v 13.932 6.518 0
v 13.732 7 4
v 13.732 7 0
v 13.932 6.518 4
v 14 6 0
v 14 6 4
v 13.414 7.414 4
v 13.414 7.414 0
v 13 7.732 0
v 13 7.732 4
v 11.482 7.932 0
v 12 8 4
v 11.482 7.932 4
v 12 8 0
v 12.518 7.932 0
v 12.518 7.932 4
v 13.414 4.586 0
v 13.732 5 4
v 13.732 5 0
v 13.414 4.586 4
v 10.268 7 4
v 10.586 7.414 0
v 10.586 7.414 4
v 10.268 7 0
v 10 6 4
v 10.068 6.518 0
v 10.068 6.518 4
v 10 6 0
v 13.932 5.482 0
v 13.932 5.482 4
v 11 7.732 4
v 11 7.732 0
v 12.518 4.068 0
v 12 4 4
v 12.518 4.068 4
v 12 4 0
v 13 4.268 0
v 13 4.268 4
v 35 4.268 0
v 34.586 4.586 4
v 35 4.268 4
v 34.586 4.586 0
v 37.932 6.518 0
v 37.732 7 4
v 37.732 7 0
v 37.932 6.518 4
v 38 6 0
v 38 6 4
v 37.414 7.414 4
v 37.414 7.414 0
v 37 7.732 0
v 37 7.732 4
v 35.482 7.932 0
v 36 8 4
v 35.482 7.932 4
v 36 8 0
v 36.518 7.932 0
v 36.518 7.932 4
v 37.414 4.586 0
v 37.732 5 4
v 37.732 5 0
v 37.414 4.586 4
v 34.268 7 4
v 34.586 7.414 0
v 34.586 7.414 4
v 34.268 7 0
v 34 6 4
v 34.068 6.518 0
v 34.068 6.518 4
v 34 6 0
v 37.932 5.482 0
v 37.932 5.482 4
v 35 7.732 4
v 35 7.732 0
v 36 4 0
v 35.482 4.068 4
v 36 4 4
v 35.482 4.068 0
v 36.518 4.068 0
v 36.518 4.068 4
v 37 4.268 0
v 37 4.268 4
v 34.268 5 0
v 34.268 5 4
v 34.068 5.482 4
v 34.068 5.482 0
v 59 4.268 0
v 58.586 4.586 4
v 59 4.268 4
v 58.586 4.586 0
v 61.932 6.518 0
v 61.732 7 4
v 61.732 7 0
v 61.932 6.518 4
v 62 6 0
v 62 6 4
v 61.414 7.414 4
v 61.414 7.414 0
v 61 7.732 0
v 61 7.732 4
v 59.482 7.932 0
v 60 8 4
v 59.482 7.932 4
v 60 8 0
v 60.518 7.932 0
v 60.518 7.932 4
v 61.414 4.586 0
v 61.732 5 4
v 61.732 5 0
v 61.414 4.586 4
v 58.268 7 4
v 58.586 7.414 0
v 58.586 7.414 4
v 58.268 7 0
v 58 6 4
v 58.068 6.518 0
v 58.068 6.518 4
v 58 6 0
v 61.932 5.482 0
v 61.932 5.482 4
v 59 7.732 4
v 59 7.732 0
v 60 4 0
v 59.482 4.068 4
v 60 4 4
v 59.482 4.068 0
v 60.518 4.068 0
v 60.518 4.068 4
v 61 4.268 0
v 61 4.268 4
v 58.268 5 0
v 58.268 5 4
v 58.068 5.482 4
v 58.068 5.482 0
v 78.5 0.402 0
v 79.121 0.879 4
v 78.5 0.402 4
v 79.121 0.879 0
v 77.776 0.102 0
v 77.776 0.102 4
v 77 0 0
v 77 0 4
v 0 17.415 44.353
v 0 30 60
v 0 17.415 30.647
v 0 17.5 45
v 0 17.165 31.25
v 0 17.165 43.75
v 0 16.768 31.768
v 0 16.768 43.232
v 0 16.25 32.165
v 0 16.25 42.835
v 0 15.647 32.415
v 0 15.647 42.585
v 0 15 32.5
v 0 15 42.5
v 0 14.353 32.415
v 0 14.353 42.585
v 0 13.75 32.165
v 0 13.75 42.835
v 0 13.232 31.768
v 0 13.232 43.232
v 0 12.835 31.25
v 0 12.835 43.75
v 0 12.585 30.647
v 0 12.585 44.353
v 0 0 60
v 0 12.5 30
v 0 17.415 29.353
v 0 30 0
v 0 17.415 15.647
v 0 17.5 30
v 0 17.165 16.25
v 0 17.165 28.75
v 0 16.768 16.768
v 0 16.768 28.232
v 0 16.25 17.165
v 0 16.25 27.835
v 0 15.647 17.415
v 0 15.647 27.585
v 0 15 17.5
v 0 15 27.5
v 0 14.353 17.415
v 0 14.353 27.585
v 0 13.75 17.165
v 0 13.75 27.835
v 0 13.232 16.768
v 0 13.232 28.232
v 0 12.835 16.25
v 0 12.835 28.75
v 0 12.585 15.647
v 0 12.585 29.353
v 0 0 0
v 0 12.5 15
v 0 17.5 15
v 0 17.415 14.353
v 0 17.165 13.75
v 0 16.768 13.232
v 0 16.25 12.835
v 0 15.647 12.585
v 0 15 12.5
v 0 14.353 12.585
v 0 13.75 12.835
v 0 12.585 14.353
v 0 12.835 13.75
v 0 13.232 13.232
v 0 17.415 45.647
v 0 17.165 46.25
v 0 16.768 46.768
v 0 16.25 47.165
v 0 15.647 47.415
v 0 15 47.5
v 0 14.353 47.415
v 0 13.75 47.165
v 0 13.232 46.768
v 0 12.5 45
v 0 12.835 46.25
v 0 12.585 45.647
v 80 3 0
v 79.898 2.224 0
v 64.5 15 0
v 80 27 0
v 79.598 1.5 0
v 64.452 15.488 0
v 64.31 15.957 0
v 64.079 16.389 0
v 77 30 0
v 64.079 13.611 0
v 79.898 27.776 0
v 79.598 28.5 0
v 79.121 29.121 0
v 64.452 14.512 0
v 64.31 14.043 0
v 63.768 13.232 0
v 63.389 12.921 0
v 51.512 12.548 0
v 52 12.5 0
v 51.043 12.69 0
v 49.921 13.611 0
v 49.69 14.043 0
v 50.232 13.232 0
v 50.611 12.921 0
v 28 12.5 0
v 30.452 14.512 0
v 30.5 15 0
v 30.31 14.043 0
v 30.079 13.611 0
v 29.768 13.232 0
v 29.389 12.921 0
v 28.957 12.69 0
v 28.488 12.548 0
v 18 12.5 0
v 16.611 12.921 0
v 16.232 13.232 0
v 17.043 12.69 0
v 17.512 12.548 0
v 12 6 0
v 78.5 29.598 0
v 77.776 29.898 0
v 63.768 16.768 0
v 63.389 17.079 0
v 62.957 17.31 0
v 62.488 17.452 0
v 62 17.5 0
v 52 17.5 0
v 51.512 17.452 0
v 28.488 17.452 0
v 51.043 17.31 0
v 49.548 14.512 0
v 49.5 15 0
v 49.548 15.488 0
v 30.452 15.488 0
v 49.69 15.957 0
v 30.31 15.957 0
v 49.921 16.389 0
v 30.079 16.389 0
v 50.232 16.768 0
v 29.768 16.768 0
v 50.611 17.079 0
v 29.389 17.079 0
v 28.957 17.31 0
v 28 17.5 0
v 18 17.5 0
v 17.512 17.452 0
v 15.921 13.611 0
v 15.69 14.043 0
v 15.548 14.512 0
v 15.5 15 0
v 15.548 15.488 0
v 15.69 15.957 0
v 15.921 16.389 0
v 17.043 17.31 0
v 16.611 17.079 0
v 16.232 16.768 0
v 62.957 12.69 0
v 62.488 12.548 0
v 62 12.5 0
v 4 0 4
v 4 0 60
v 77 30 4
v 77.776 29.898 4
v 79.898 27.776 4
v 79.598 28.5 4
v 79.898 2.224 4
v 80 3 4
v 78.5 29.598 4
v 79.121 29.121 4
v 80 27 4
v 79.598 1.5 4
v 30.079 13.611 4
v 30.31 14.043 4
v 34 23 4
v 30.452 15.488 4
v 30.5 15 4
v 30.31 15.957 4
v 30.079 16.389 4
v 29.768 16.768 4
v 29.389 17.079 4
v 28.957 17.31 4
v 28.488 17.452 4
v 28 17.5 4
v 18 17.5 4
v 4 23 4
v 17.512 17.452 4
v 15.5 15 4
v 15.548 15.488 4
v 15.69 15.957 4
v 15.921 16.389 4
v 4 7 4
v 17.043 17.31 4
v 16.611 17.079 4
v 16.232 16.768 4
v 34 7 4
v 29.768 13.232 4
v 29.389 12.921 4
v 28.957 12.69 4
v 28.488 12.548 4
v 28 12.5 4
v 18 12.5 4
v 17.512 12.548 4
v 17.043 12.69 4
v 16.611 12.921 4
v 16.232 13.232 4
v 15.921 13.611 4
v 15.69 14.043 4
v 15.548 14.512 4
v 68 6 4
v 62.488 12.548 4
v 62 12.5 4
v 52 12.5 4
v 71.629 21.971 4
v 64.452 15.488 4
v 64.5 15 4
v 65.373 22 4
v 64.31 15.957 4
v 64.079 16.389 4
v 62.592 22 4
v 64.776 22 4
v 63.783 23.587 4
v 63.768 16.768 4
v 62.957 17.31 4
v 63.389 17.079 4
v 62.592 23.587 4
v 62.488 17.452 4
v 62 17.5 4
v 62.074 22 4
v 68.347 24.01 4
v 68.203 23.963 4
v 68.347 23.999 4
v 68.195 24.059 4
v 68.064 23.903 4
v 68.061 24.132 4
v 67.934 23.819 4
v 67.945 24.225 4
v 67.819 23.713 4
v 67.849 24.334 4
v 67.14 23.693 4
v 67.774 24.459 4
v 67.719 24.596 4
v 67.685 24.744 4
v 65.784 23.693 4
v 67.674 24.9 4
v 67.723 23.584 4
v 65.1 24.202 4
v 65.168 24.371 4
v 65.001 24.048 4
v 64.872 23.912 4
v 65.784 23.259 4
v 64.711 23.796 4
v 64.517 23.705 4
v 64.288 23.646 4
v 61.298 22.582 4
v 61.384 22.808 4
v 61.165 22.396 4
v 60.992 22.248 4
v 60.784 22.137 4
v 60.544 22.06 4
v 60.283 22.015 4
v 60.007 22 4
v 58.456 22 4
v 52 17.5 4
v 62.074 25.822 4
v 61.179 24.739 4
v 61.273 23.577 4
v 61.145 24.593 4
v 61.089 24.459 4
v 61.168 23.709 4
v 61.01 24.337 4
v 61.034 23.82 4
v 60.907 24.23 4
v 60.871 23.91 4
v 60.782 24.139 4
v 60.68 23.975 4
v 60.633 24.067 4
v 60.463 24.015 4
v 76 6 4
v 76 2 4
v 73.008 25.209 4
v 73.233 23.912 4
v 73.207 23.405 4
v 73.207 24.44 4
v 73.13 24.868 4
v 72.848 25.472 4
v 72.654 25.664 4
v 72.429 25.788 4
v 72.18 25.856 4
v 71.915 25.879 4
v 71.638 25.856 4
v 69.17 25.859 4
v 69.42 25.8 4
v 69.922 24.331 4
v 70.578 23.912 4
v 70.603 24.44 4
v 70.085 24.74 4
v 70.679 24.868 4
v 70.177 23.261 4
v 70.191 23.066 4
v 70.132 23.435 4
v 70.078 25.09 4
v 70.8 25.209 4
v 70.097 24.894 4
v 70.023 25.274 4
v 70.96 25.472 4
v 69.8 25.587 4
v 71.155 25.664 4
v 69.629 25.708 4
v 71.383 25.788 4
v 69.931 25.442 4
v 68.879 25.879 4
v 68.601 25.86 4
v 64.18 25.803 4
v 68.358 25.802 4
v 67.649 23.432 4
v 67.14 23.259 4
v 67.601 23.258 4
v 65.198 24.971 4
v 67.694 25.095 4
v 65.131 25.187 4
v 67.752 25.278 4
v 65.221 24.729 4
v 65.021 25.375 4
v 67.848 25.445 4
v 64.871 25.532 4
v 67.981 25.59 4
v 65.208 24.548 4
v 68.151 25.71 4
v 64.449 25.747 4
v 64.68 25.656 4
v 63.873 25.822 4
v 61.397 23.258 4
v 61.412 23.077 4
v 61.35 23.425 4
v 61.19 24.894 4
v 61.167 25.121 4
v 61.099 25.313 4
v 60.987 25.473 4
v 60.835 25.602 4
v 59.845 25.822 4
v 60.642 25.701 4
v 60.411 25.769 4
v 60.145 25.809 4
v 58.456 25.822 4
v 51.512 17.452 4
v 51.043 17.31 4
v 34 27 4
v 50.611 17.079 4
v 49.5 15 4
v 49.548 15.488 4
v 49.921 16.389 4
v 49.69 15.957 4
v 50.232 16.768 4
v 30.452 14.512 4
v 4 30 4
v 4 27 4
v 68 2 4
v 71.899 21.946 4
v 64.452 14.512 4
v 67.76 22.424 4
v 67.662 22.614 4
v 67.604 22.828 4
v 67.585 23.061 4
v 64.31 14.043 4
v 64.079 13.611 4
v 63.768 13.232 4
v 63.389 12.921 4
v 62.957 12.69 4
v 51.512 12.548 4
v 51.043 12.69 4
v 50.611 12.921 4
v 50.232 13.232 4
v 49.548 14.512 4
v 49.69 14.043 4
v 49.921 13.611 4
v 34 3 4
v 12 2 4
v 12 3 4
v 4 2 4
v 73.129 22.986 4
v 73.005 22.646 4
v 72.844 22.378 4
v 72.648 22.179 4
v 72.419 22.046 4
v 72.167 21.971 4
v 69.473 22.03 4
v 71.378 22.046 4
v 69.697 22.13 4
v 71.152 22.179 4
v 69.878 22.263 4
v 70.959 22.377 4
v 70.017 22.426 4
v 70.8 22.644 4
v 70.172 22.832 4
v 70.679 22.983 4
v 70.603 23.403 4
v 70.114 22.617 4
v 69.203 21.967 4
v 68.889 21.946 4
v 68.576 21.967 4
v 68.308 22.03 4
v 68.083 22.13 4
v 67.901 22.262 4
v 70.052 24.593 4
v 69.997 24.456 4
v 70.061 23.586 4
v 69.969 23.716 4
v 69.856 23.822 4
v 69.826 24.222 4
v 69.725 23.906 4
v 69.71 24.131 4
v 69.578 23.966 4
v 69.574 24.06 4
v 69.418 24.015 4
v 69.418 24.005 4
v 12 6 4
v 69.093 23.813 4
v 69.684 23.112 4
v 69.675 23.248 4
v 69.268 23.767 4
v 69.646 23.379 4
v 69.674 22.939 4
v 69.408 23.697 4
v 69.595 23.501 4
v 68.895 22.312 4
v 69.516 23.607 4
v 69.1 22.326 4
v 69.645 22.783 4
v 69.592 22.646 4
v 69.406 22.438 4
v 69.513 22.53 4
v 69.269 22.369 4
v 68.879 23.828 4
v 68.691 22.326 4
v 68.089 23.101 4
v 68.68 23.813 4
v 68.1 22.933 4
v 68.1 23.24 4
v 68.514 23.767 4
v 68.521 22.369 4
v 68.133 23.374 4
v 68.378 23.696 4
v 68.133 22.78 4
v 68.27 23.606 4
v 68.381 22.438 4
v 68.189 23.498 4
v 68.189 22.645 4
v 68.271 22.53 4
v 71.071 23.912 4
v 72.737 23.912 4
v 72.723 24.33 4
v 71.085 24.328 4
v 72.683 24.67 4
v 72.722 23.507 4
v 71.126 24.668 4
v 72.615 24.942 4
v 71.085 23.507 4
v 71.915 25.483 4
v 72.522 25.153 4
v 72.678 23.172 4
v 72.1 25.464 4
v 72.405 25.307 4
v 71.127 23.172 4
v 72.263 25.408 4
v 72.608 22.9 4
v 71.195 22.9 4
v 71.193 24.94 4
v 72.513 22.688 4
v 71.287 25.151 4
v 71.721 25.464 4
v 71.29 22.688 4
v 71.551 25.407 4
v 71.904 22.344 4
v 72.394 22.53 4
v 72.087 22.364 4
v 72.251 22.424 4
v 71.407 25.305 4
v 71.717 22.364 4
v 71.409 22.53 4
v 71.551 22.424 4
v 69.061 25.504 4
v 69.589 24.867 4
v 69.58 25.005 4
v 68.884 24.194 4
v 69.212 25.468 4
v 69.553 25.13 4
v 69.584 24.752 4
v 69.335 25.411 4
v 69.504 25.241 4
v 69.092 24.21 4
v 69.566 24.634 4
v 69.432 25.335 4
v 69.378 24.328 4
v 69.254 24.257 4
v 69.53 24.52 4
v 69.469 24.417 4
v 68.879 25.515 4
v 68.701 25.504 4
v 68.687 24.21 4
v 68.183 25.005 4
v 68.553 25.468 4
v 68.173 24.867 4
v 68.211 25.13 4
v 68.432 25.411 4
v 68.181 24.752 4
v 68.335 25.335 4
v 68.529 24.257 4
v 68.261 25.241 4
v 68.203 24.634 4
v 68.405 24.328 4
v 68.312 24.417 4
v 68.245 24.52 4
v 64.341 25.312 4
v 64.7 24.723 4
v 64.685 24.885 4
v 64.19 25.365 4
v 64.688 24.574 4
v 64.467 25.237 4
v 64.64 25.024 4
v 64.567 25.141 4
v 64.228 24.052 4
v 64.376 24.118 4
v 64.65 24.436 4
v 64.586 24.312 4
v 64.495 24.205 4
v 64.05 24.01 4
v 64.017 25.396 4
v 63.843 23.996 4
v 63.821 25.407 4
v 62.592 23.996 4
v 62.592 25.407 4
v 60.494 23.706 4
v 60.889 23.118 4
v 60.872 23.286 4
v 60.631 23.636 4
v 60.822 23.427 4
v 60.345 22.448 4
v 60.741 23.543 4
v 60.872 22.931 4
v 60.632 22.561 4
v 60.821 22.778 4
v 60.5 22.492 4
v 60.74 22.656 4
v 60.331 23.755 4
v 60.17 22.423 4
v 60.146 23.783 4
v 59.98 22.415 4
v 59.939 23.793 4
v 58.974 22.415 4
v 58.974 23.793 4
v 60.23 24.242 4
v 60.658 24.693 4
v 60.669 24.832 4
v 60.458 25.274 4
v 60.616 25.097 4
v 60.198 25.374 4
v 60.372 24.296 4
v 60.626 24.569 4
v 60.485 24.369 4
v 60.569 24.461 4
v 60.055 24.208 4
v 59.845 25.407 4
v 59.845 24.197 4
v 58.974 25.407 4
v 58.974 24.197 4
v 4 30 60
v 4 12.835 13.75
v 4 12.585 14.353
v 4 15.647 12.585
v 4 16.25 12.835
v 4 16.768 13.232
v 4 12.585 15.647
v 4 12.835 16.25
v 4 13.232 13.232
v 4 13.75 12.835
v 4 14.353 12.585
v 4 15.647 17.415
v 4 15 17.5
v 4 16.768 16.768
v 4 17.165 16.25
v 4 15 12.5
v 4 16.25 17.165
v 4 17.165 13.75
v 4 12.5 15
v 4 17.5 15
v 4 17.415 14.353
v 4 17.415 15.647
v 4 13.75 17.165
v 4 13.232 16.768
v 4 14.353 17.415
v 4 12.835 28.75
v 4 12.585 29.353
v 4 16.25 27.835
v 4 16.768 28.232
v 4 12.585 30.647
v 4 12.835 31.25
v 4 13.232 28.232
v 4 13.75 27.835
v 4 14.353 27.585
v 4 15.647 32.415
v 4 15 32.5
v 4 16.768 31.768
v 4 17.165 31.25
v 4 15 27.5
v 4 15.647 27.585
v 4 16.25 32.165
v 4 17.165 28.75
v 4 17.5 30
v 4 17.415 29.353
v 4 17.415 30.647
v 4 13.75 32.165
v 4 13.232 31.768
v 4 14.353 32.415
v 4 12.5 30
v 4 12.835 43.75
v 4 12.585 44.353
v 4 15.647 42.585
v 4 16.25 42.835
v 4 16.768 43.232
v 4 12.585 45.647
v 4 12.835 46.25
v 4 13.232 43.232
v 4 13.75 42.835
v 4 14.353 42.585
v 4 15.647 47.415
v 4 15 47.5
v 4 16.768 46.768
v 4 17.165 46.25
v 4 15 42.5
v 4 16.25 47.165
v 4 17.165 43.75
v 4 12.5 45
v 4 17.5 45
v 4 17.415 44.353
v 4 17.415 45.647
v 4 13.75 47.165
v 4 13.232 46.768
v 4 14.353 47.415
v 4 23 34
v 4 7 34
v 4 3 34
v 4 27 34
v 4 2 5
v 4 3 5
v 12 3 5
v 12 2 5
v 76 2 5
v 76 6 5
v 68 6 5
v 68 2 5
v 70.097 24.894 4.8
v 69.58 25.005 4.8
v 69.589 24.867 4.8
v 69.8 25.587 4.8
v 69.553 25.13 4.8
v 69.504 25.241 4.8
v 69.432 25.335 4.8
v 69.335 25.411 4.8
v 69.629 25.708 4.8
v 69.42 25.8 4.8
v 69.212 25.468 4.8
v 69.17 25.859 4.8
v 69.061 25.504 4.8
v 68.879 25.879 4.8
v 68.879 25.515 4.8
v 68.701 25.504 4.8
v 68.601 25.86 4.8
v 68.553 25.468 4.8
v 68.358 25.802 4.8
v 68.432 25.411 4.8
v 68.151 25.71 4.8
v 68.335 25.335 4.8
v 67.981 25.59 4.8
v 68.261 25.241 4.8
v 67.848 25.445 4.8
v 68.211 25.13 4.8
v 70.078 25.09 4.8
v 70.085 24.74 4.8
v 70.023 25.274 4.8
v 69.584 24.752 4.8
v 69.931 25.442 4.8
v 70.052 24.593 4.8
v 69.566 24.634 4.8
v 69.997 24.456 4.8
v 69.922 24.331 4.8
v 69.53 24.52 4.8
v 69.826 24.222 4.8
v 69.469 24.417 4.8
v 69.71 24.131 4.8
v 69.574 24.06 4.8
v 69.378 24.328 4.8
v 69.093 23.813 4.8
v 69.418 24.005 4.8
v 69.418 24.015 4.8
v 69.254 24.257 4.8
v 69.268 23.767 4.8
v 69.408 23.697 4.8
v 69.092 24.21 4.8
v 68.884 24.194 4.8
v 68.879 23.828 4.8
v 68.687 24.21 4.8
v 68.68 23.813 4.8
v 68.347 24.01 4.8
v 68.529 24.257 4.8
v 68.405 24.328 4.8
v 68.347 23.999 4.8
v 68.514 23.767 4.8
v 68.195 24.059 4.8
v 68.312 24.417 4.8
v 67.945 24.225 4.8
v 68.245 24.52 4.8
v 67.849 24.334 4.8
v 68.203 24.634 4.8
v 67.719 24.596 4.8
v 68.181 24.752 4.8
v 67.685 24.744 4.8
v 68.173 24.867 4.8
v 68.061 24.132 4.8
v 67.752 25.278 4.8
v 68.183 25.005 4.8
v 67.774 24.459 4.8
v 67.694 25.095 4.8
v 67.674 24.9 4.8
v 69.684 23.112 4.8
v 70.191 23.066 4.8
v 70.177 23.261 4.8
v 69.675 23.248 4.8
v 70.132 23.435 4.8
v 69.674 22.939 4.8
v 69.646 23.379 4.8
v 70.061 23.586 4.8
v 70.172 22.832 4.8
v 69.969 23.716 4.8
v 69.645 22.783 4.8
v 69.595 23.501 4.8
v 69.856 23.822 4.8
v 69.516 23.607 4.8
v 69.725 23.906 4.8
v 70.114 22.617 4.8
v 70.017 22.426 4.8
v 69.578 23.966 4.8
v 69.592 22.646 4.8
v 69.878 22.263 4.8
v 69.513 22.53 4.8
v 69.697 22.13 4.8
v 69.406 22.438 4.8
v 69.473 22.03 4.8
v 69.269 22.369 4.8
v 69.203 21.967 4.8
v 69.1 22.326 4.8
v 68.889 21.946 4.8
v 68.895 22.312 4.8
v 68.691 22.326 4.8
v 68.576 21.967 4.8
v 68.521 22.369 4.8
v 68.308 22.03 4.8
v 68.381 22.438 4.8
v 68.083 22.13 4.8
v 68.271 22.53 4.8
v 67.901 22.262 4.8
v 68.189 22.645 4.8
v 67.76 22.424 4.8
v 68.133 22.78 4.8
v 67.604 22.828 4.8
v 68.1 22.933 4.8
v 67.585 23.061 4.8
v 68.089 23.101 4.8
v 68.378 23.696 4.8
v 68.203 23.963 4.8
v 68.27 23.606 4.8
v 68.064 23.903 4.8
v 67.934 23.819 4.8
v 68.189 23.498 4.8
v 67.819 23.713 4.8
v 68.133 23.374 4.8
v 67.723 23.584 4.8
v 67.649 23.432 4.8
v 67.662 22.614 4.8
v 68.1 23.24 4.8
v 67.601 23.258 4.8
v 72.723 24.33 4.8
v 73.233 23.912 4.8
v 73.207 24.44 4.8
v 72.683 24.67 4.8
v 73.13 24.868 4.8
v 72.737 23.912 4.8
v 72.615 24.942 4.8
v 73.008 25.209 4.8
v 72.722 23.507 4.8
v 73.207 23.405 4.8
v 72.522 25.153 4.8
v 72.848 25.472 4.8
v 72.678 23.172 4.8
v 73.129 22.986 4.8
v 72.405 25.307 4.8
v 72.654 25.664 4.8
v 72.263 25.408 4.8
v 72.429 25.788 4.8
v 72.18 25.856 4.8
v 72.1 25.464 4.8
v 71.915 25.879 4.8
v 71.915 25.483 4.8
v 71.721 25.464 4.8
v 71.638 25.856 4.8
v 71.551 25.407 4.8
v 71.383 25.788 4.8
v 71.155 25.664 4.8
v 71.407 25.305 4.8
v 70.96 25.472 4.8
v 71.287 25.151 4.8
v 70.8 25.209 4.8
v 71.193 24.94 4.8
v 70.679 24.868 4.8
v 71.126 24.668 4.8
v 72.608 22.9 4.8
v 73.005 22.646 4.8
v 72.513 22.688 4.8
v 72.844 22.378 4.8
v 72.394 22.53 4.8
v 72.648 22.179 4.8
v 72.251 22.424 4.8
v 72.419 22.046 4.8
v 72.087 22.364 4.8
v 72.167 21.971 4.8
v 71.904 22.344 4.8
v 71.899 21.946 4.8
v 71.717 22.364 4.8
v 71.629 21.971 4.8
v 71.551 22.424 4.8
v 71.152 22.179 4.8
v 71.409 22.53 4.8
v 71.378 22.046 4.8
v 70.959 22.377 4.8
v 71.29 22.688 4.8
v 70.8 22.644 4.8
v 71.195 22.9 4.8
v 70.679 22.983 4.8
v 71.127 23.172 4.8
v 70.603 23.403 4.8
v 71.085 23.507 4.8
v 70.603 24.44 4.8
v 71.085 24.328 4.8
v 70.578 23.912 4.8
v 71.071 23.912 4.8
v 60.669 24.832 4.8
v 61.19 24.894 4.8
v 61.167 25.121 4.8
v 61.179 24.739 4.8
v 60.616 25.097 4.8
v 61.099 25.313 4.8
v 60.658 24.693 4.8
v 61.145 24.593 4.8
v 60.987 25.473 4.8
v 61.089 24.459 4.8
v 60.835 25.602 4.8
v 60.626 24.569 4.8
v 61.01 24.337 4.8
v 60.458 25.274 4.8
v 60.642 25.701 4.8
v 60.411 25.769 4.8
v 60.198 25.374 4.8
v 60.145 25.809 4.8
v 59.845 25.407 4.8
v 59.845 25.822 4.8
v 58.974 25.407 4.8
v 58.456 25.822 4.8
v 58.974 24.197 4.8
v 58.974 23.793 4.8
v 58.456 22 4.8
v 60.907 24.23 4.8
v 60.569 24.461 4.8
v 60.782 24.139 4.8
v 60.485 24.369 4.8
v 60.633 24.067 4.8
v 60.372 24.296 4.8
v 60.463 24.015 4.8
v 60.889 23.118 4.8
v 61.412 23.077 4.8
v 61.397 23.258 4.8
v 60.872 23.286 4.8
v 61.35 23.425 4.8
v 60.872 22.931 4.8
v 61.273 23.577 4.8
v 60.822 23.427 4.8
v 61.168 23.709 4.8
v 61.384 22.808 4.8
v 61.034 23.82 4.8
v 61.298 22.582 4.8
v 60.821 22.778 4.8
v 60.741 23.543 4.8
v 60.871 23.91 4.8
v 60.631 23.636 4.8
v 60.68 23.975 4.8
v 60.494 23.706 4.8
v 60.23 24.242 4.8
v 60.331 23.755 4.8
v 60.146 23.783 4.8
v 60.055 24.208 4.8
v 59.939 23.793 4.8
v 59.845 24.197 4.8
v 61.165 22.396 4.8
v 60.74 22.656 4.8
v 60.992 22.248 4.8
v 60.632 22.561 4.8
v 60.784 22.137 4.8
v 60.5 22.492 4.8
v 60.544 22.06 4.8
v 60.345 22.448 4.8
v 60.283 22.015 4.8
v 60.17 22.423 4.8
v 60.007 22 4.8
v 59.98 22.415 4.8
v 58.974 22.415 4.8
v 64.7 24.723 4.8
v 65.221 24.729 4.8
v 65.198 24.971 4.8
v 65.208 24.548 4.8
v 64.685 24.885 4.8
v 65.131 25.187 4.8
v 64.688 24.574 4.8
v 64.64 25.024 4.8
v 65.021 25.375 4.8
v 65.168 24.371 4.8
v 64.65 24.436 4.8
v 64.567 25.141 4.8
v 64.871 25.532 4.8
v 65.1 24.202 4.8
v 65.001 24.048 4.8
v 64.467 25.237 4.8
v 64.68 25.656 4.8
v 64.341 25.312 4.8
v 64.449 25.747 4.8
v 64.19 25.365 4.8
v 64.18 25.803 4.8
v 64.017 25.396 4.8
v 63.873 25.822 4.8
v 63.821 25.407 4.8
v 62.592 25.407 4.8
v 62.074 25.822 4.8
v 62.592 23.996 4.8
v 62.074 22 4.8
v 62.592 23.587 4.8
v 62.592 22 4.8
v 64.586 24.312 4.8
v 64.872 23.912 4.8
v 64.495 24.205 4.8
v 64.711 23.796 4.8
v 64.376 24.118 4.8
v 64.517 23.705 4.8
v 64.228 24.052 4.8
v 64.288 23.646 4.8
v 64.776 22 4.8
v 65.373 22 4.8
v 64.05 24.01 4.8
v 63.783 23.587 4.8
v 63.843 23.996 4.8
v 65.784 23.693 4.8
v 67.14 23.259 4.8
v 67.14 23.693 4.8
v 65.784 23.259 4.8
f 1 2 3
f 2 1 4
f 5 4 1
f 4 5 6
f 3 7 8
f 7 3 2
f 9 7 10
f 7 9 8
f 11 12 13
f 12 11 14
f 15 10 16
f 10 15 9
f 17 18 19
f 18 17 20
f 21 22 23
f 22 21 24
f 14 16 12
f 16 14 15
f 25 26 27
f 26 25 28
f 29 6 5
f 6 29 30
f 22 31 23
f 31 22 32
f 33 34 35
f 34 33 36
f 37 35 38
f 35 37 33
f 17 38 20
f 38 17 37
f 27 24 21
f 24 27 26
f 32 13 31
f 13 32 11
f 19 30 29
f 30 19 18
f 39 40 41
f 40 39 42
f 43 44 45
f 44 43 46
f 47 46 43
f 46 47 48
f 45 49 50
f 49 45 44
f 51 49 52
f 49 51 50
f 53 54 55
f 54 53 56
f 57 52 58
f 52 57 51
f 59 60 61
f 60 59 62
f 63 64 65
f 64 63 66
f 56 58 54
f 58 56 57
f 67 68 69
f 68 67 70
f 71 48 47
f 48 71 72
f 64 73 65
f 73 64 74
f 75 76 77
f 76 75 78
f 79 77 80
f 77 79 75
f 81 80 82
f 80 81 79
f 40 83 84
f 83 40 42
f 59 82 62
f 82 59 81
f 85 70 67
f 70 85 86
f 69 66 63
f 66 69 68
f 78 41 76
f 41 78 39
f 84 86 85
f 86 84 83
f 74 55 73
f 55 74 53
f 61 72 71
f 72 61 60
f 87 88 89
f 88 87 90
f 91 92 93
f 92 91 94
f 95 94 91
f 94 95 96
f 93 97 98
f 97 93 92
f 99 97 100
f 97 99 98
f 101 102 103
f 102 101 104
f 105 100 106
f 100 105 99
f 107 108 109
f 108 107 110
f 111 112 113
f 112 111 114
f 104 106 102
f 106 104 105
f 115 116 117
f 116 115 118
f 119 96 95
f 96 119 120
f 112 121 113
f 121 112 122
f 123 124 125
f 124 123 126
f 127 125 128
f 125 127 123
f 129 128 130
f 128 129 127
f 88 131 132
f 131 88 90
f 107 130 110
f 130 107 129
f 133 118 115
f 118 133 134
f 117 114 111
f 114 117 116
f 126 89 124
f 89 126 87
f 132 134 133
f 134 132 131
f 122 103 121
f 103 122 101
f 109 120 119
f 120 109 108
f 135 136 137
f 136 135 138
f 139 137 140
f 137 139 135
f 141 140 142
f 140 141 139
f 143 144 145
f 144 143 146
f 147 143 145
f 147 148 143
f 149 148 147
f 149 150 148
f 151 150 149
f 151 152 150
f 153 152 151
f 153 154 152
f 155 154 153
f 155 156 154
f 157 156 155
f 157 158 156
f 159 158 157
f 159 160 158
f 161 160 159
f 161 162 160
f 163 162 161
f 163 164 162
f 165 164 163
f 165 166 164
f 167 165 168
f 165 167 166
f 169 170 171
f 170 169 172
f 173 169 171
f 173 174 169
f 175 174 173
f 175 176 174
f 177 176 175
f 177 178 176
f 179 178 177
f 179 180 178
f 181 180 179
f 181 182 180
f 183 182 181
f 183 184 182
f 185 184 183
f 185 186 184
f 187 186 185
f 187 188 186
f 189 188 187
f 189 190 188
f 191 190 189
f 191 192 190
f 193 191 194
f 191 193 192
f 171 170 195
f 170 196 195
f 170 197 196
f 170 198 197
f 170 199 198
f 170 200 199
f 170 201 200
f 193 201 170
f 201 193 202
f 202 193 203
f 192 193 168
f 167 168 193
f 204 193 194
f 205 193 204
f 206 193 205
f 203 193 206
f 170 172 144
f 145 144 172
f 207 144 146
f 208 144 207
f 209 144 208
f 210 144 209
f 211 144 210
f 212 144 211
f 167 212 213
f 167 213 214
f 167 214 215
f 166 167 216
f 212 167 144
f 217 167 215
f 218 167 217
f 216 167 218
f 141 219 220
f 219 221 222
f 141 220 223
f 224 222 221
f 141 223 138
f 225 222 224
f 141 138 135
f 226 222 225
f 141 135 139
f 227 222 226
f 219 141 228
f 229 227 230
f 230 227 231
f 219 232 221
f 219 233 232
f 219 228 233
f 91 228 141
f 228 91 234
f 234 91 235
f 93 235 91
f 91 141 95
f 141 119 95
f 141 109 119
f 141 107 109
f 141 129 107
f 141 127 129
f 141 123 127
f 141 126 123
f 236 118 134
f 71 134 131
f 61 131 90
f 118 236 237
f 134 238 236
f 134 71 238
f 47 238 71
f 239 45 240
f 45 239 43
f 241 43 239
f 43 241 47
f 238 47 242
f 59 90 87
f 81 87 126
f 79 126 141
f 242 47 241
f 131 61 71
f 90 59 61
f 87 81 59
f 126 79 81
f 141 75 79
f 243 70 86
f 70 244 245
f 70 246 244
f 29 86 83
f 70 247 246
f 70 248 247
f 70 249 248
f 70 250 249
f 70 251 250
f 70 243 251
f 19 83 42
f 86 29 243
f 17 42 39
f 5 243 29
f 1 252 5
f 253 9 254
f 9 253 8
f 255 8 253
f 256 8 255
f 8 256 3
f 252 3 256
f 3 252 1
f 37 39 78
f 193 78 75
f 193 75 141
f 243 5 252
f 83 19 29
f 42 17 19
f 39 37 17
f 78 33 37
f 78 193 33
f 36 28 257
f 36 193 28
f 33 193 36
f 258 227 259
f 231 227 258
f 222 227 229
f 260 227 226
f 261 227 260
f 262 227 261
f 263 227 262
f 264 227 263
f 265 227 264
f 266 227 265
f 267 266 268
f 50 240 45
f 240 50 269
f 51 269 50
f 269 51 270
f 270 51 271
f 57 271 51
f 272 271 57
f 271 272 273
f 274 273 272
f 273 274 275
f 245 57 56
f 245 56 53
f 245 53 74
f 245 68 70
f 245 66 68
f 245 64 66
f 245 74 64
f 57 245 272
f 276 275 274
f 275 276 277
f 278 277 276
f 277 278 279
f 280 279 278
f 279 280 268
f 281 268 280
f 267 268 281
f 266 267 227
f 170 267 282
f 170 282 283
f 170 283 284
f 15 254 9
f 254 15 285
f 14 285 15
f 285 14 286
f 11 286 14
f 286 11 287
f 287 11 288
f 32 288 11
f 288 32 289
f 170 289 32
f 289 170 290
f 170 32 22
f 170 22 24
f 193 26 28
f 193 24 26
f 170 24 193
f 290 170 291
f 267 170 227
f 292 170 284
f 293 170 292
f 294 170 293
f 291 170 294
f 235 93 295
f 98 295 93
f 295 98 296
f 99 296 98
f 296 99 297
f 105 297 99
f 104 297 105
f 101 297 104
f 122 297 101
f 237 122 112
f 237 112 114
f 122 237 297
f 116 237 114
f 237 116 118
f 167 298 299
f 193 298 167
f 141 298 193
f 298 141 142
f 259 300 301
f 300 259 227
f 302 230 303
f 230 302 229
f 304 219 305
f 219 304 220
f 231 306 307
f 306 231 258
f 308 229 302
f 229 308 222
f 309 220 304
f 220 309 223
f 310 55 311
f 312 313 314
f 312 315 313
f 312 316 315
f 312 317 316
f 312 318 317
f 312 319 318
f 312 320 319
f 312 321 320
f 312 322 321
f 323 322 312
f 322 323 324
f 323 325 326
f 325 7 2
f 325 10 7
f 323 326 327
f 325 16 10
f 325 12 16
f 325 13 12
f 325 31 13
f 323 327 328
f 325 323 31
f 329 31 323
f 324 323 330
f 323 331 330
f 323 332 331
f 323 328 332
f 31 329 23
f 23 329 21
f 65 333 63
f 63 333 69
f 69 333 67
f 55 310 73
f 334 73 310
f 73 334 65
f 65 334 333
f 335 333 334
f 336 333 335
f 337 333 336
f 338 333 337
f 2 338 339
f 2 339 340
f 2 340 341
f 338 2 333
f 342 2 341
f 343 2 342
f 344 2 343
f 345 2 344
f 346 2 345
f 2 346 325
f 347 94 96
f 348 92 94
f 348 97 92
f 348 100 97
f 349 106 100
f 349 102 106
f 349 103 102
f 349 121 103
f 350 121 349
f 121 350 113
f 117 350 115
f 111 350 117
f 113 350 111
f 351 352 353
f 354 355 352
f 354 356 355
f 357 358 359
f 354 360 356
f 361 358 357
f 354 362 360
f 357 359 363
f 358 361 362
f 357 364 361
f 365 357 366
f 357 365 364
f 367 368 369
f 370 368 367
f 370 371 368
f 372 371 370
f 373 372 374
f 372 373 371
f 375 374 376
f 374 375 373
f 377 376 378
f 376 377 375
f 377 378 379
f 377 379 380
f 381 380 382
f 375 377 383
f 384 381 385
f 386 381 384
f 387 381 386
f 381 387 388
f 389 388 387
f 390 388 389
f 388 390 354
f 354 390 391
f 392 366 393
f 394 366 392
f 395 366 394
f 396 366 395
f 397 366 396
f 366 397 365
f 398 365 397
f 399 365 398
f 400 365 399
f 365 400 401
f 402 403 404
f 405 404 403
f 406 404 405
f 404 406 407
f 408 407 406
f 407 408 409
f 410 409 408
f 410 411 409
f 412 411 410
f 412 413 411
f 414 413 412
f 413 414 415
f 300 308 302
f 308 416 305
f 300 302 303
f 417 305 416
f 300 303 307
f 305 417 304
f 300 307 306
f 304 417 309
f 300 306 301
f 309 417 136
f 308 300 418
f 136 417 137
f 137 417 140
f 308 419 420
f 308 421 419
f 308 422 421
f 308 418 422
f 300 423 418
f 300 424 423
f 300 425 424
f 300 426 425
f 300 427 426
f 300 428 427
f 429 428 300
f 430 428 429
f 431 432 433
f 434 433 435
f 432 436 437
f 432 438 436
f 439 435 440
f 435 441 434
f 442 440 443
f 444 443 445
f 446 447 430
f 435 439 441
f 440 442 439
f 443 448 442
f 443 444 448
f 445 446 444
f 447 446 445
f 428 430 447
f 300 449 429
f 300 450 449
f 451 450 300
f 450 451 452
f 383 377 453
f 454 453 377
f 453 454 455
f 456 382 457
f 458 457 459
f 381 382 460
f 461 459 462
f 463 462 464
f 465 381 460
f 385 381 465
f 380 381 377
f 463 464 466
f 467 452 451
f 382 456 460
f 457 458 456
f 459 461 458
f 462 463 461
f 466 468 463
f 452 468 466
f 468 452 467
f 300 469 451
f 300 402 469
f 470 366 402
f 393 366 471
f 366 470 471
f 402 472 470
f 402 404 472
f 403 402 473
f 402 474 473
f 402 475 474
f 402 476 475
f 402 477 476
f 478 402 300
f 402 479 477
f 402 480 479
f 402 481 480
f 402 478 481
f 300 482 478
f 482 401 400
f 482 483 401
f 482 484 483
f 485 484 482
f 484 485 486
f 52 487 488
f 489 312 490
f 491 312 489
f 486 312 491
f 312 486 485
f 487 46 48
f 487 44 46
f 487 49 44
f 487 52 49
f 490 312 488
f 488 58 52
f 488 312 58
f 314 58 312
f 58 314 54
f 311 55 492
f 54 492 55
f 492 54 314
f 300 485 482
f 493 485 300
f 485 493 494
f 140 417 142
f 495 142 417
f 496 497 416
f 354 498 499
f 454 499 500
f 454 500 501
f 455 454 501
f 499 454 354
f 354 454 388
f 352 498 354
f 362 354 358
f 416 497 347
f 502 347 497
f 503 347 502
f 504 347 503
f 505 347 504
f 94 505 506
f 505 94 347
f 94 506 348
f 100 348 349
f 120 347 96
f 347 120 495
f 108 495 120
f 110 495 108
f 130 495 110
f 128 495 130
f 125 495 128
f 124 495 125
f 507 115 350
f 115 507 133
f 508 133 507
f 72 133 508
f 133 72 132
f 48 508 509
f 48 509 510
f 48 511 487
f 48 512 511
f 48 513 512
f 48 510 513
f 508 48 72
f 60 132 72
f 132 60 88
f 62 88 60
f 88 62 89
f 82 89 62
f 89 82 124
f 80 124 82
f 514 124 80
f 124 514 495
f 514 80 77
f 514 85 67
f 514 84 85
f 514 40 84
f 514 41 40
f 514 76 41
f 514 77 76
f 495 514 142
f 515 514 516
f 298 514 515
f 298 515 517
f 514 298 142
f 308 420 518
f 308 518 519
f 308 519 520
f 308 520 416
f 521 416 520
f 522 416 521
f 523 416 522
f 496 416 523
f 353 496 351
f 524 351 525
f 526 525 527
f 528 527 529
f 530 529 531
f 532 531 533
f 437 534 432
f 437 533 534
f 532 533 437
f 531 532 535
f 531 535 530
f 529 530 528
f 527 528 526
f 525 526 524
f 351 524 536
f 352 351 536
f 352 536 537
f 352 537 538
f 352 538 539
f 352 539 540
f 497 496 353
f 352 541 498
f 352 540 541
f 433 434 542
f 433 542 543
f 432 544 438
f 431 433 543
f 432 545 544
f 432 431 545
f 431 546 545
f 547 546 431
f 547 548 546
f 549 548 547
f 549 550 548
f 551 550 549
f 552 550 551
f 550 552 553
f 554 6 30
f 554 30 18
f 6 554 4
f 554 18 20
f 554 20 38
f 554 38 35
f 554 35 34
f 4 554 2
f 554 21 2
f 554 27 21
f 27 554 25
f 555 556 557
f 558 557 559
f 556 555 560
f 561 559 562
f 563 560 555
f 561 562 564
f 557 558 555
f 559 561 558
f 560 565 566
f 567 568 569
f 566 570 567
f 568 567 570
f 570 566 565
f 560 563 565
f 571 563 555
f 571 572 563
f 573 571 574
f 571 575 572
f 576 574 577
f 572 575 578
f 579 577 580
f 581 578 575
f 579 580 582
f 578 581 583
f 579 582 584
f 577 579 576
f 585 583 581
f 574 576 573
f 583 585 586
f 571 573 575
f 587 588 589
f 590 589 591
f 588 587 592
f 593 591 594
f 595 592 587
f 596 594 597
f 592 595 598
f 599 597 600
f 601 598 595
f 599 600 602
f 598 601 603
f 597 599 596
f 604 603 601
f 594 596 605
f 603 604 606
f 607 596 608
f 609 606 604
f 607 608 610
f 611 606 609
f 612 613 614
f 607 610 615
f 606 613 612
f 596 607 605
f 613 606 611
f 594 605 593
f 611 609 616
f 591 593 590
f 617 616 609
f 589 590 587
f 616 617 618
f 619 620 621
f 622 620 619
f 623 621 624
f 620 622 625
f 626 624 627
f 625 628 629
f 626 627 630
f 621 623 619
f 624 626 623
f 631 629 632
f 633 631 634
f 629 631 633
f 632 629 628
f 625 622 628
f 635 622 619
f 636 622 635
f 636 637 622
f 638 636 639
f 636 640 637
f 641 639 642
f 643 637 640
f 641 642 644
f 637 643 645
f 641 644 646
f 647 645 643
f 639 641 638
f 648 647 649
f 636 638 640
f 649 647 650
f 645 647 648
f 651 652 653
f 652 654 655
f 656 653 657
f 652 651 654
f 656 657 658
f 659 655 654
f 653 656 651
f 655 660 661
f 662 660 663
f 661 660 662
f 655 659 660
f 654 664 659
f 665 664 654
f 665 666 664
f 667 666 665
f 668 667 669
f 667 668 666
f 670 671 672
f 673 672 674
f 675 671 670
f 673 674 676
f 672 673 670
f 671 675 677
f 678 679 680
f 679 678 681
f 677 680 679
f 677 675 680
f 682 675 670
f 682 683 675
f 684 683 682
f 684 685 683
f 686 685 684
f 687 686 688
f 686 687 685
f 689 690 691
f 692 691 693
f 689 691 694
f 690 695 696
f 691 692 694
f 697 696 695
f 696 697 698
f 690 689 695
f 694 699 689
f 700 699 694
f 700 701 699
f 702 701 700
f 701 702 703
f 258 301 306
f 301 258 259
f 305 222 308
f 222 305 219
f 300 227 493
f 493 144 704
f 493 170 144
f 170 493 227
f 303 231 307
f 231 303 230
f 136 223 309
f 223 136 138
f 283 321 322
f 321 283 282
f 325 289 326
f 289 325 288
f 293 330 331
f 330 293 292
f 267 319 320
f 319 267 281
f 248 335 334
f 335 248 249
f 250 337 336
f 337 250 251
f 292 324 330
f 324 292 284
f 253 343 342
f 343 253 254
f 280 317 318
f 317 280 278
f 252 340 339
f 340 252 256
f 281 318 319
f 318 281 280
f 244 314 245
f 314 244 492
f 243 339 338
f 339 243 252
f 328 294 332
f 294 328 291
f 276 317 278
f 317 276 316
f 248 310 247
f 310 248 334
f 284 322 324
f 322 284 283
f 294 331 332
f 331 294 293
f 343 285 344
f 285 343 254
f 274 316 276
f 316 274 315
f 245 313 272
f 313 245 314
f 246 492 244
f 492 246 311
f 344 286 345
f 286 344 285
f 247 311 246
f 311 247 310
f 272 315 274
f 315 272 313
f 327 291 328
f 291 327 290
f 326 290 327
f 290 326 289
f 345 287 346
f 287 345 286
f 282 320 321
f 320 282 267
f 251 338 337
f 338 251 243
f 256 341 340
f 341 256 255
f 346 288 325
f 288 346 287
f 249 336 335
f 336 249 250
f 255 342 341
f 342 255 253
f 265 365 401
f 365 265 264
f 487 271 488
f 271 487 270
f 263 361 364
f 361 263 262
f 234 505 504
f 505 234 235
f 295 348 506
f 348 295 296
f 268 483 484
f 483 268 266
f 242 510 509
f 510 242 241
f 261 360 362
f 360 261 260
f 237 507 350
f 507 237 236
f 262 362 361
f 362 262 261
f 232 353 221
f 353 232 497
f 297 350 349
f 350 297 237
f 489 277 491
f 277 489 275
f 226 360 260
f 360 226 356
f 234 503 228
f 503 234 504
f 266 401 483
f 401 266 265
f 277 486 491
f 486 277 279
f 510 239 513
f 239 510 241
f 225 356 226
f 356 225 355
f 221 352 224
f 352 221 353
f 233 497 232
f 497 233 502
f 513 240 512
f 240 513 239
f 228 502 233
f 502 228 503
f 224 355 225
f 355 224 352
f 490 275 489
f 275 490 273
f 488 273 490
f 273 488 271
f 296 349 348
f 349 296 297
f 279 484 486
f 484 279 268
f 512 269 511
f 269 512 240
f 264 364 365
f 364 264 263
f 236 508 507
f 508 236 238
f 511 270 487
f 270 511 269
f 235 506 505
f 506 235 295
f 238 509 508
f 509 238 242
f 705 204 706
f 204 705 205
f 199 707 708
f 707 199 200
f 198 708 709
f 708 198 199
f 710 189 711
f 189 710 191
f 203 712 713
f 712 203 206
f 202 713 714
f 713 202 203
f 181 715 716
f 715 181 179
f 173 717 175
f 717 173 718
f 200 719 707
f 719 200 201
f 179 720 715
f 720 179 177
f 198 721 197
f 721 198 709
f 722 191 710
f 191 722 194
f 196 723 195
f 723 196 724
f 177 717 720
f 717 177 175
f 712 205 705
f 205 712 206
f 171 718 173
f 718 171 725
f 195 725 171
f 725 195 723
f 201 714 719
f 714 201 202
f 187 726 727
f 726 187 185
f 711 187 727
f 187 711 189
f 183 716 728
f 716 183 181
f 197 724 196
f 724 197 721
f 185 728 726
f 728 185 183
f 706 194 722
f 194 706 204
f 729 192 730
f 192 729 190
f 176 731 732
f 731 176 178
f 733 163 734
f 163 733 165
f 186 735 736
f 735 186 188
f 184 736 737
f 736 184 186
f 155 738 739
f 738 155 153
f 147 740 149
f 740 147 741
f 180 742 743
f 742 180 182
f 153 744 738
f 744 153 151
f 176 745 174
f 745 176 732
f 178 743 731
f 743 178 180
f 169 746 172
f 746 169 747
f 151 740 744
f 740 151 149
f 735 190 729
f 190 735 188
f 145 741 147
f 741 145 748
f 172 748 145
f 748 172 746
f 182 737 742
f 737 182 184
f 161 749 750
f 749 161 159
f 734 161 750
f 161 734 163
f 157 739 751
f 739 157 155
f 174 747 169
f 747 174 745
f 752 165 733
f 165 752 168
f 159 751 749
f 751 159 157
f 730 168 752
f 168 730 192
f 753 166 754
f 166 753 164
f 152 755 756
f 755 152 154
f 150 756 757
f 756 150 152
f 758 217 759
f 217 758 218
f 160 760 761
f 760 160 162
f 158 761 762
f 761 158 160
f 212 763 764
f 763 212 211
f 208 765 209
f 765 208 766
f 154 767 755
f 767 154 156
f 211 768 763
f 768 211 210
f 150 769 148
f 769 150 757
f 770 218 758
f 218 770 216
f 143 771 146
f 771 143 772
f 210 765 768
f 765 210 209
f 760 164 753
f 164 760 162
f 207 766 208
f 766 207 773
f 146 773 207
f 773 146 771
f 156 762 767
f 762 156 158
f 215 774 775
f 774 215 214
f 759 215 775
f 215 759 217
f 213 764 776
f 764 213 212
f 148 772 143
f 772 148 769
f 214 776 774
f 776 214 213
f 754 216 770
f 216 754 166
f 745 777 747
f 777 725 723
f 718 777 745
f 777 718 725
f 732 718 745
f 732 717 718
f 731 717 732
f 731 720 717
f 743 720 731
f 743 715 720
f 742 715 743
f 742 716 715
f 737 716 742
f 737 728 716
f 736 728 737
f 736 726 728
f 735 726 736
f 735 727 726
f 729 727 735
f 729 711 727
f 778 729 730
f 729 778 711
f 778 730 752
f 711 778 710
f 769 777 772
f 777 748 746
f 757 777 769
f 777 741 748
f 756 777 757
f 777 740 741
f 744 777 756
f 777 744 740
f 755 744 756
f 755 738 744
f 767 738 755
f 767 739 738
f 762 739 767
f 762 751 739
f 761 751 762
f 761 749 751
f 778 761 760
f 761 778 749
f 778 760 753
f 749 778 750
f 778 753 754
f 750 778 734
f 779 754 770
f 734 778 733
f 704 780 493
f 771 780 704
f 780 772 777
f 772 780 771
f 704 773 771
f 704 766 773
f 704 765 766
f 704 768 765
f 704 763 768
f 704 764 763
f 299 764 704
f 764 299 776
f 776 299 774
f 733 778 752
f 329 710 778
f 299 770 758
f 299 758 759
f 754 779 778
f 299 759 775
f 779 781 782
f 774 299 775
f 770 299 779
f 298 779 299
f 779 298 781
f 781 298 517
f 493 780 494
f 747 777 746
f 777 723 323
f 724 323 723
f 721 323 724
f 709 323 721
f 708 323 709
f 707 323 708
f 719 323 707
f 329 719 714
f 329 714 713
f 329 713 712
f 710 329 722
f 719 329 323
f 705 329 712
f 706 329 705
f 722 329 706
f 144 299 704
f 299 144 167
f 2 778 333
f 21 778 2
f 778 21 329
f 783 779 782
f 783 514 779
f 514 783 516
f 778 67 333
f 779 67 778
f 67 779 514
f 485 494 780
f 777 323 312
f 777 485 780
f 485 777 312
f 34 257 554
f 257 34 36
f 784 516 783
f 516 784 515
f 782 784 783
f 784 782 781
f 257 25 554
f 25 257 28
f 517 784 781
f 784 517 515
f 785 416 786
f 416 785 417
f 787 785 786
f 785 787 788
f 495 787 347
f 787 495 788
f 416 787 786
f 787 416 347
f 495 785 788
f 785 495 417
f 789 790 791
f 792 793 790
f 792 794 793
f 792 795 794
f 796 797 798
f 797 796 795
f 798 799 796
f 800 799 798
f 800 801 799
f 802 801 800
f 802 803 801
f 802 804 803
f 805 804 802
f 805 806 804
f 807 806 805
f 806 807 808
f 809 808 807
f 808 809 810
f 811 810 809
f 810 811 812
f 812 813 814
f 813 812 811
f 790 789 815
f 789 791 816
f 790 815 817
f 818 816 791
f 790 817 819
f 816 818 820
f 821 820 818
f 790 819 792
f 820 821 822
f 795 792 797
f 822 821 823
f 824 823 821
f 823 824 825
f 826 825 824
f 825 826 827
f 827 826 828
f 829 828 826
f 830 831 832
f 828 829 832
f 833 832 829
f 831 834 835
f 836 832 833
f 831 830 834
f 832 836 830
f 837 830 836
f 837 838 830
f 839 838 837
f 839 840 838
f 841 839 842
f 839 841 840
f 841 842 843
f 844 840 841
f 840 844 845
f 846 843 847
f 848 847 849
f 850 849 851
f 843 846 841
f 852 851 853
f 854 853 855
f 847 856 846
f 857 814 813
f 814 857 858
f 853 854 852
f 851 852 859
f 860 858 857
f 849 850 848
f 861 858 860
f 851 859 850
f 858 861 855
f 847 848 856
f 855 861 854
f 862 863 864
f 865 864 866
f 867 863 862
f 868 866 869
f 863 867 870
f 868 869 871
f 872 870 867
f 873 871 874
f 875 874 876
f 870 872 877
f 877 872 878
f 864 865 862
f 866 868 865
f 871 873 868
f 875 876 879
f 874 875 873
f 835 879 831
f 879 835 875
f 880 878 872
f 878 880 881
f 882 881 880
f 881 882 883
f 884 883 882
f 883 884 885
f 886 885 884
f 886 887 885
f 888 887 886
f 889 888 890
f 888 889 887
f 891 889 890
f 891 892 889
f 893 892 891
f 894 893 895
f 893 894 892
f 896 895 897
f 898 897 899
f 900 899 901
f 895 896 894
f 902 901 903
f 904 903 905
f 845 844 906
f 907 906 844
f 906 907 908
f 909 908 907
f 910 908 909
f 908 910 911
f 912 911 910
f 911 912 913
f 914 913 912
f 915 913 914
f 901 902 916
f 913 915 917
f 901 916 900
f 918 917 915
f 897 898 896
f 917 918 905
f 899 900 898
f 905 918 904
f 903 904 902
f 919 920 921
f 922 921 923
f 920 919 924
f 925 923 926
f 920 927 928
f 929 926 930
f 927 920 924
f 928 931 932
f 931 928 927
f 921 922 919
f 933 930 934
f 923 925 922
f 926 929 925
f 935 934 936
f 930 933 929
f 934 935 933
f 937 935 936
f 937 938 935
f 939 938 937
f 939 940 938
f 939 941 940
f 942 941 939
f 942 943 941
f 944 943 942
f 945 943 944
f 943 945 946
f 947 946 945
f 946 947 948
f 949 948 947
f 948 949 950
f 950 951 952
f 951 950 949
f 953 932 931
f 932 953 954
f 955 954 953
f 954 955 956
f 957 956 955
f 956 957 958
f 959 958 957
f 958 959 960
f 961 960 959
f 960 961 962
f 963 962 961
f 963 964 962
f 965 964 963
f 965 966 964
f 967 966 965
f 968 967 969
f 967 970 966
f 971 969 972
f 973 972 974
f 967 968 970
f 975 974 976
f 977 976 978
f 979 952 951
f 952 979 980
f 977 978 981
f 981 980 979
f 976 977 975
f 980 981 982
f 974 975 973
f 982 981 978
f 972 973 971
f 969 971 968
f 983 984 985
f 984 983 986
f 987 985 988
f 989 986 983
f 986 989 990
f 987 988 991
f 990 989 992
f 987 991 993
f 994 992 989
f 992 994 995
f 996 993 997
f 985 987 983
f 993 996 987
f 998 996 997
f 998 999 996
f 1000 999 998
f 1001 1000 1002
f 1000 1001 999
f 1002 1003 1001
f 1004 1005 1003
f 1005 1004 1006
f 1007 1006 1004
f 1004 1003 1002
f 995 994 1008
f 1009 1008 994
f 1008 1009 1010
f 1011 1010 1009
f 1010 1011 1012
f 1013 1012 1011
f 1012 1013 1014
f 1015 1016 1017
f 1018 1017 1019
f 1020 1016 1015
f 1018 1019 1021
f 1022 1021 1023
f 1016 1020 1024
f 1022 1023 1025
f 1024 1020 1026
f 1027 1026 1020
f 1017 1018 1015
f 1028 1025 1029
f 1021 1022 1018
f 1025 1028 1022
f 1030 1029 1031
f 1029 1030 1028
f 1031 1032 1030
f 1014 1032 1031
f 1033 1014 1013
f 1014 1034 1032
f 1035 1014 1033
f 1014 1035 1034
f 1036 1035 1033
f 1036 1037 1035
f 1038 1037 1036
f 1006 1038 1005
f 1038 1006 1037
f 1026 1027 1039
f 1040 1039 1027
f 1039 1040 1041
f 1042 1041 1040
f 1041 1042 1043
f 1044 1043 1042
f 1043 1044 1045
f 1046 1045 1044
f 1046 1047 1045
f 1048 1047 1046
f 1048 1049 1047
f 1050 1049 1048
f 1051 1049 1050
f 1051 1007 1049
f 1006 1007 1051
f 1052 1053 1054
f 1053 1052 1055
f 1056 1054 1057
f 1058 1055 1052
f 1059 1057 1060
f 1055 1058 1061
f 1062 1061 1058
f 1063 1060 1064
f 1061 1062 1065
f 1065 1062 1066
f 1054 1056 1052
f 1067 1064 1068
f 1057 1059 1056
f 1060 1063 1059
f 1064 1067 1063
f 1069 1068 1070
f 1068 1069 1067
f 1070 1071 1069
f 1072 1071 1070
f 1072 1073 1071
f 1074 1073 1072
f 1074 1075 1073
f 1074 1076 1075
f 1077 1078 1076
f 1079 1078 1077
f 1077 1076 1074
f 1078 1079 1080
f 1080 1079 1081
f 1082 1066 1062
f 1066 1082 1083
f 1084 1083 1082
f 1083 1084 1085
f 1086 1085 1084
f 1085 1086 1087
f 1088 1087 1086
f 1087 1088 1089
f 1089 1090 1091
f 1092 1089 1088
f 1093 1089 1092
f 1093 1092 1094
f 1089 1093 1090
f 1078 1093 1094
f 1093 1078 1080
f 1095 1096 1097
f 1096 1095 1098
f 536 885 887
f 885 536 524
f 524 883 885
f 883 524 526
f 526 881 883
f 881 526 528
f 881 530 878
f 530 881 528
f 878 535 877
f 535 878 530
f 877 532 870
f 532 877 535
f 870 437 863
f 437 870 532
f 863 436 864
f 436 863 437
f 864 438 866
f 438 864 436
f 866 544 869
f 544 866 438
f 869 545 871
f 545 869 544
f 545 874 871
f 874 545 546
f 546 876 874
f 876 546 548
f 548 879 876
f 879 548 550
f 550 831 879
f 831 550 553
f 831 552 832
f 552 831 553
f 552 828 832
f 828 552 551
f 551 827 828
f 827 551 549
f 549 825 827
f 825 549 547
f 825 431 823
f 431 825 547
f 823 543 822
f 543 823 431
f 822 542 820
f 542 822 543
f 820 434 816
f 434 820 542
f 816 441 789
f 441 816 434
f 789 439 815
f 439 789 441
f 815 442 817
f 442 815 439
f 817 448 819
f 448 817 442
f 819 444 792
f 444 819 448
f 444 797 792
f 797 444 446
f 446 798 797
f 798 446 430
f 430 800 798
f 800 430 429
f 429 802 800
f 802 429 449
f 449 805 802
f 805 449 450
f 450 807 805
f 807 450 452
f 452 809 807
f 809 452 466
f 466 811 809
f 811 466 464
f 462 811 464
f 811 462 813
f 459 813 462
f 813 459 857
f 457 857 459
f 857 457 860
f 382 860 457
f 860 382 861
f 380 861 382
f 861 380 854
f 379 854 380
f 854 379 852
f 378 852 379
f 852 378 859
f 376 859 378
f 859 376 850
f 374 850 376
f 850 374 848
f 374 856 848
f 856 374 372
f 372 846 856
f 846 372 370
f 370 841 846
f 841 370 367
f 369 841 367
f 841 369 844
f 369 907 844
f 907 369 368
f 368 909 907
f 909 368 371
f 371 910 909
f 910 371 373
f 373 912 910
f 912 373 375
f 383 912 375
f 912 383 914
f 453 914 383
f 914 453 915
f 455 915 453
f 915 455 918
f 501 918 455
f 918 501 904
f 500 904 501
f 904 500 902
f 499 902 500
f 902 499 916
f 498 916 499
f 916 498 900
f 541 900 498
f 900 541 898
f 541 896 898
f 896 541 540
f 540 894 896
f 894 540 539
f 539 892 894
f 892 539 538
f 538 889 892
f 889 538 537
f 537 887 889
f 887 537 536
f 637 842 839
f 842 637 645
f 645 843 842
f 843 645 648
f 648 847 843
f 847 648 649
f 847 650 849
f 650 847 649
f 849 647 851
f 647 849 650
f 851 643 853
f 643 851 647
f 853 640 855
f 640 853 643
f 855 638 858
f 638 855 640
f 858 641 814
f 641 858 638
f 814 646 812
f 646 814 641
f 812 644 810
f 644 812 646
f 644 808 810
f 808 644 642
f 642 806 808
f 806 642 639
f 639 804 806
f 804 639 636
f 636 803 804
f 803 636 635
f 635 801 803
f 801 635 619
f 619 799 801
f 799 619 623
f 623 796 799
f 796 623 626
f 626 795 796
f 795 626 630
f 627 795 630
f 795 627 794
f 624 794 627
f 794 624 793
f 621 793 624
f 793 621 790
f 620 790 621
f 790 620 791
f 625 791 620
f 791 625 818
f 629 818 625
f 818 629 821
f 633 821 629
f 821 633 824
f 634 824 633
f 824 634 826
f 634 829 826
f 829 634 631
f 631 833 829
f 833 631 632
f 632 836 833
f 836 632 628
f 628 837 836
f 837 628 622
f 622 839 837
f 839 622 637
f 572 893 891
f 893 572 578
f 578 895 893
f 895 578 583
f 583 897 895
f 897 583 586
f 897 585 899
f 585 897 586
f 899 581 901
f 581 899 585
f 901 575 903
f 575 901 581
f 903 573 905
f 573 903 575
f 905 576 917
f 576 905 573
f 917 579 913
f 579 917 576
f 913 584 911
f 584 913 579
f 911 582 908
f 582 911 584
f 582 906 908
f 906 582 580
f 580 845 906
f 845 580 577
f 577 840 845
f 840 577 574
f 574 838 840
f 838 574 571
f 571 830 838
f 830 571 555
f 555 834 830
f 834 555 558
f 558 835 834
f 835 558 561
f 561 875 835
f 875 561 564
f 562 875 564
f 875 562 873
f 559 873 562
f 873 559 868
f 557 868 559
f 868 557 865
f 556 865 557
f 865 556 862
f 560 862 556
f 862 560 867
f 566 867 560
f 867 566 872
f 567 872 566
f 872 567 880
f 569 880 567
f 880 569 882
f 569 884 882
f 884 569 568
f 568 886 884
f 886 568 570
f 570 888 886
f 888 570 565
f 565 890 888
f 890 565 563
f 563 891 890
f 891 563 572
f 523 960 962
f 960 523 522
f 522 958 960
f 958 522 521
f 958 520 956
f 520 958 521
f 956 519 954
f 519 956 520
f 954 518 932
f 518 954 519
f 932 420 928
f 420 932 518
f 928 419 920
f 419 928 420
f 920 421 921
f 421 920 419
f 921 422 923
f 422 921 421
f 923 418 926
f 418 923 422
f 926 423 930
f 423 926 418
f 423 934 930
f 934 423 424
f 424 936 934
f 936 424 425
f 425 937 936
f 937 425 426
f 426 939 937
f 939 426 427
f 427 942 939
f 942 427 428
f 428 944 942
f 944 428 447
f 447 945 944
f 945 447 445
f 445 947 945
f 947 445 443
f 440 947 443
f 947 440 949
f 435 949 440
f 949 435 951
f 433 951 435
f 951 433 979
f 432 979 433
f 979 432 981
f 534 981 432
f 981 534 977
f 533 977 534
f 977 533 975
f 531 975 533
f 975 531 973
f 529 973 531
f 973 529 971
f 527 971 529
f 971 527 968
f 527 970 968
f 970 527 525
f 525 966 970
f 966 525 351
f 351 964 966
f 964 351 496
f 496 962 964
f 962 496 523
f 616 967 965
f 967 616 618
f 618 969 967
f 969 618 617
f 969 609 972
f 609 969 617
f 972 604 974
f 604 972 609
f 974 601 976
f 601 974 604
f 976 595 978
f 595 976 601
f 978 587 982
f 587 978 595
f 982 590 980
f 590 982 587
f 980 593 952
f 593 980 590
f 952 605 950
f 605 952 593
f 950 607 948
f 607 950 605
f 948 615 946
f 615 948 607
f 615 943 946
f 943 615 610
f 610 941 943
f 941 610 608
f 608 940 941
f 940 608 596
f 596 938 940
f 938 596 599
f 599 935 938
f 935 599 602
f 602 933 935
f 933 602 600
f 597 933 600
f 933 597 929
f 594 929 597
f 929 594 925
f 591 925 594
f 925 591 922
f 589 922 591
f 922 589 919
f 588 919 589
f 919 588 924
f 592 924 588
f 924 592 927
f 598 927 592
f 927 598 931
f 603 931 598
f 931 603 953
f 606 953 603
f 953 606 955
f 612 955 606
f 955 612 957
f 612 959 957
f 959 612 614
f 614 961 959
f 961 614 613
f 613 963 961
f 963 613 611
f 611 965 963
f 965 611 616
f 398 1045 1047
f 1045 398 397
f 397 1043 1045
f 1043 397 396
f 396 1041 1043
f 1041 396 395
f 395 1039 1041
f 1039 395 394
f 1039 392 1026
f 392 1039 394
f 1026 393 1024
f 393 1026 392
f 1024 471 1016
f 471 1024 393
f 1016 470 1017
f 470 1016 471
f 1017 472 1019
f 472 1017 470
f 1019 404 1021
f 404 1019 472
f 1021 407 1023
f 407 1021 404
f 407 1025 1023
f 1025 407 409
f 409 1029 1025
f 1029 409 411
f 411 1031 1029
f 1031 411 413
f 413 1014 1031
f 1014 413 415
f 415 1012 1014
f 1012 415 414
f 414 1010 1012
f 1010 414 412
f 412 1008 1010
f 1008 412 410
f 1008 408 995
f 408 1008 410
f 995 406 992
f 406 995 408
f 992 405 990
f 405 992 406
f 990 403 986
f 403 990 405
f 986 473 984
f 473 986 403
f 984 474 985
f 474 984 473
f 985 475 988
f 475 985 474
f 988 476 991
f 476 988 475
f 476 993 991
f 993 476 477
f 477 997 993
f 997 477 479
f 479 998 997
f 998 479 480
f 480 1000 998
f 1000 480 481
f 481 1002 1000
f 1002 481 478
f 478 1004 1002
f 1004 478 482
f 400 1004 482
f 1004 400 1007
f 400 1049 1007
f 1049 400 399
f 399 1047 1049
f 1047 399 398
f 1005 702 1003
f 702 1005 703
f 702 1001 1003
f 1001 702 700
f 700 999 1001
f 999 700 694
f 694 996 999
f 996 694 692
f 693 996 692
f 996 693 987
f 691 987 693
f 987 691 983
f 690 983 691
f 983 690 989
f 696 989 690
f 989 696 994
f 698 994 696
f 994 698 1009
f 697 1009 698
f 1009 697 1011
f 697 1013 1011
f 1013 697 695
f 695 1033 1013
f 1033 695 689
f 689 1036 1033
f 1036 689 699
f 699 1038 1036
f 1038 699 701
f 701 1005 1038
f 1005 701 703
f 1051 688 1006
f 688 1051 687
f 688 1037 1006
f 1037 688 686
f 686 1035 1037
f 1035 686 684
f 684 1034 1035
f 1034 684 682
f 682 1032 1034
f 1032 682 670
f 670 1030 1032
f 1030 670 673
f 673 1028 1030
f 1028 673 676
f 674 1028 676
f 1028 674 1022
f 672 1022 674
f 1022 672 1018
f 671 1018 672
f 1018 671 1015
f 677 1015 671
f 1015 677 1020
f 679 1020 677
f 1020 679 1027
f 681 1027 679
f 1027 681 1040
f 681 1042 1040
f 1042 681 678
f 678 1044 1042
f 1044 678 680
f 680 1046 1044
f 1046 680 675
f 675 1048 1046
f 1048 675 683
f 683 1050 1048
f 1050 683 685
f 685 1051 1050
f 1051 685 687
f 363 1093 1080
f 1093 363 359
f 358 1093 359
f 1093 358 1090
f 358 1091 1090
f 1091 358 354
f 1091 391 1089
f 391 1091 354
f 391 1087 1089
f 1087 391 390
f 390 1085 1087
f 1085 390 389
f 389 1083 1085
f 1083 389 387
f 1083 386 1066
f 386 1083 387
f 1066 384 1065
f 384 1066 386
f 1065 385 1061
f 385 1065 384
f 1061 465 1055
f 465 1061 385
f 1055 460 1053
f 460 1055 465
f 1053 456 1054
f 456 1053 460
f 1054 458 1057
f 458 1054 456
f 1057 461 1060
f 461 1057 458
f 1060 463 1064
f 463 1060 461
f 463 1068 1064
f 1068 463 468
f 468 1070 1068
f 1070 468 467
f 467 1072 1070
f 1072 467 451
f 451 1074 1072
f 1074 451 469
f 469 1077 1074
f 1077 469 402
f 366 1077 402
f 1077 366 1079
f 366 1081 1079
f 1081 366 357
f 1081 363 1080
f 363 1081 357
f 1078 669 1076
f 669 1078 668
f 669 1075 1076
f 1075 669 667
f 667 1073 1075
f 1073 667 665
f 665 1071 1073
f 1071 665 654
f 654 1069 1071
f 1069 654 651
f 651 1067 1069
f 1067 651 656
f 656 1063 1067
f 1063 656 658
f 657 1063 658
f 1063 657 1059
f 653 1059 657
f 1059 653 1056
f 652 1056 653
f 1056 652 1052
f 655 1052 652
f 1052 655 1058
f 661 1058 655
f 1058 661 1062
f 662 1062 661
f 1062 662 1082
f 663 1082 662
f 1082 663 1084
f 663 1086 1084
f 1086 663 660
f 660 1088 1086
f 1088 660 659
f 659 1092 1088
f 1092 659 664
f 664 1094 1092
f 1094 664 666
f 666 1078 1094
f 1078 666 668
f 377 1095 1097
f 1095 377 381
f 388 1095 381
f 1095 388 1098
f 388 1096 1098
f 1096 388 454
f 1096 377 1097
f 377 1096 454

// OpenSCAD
// Test model: L-shaped shelf bracket with slotted mounting holes, a gusset, lightening holes and
// a raised part number. Only axis-aligned prisms, so it converts without code blocks.

t = 4;            // plate thickness
a = 60;           // vertical leg
b = 80;           // horizontal leg
w = 30;           // width
slot = [10, 5];

module slot2d(len, d) {
  hull() for (x = [0, len]) translate([x, 0]) circle(d = d, $fn = 32);
}

module holes(n, pitch) {
  for (i = [0 : n - 1]) translate([i * pitch, 0]) children();
}

// horizontal leg with two slots and three lightening holes
difference() {
  linear_extrude(t) offset(r = 3, $fn = 24) offset(delta = -3) square([b, w]);
  translate([18, w / 2, -1]) linear_extrude(t + 2) slot2d(slot.x, slot.y);
  translate([52, w / 2, -1]) linear_extrude(t + 2) slot2d(slot.x, slot.y);
  for (i = [0 : 2]) translate([12 + i * 24, 6, -1]) cylinder(d = 4, h = t + 2, $fn = 24);
}

// vertical leg with a row of holes
difference() {
  translate([0, 0, 0]) cube([t, w, a]);
  for (z = [15, 30, 45]) translate([-1, w / 2, z]) rotate([0, 90, 0]) cylinder(d = 5, h = t + 2, $fn = 24);
}

// two gussets (triangles extruded across the width)
for (y = [3, w - 3 - t]) translate([0, y + t, 0]) rotate([90, 0, 0])
  linear_extrude(t) polygon([[t, t], [t + 30, t], [t, t + 30]]);

// raised part number on the top face
translate([b - 22, w - 8, t]) linear_extrude(0.8) text("BR-80", size = 4, font = "Liberation Sans");

// corner pads
holes(2, b - 16) translate([4, 2, 0]) cube([8, 4, t + 1]);
